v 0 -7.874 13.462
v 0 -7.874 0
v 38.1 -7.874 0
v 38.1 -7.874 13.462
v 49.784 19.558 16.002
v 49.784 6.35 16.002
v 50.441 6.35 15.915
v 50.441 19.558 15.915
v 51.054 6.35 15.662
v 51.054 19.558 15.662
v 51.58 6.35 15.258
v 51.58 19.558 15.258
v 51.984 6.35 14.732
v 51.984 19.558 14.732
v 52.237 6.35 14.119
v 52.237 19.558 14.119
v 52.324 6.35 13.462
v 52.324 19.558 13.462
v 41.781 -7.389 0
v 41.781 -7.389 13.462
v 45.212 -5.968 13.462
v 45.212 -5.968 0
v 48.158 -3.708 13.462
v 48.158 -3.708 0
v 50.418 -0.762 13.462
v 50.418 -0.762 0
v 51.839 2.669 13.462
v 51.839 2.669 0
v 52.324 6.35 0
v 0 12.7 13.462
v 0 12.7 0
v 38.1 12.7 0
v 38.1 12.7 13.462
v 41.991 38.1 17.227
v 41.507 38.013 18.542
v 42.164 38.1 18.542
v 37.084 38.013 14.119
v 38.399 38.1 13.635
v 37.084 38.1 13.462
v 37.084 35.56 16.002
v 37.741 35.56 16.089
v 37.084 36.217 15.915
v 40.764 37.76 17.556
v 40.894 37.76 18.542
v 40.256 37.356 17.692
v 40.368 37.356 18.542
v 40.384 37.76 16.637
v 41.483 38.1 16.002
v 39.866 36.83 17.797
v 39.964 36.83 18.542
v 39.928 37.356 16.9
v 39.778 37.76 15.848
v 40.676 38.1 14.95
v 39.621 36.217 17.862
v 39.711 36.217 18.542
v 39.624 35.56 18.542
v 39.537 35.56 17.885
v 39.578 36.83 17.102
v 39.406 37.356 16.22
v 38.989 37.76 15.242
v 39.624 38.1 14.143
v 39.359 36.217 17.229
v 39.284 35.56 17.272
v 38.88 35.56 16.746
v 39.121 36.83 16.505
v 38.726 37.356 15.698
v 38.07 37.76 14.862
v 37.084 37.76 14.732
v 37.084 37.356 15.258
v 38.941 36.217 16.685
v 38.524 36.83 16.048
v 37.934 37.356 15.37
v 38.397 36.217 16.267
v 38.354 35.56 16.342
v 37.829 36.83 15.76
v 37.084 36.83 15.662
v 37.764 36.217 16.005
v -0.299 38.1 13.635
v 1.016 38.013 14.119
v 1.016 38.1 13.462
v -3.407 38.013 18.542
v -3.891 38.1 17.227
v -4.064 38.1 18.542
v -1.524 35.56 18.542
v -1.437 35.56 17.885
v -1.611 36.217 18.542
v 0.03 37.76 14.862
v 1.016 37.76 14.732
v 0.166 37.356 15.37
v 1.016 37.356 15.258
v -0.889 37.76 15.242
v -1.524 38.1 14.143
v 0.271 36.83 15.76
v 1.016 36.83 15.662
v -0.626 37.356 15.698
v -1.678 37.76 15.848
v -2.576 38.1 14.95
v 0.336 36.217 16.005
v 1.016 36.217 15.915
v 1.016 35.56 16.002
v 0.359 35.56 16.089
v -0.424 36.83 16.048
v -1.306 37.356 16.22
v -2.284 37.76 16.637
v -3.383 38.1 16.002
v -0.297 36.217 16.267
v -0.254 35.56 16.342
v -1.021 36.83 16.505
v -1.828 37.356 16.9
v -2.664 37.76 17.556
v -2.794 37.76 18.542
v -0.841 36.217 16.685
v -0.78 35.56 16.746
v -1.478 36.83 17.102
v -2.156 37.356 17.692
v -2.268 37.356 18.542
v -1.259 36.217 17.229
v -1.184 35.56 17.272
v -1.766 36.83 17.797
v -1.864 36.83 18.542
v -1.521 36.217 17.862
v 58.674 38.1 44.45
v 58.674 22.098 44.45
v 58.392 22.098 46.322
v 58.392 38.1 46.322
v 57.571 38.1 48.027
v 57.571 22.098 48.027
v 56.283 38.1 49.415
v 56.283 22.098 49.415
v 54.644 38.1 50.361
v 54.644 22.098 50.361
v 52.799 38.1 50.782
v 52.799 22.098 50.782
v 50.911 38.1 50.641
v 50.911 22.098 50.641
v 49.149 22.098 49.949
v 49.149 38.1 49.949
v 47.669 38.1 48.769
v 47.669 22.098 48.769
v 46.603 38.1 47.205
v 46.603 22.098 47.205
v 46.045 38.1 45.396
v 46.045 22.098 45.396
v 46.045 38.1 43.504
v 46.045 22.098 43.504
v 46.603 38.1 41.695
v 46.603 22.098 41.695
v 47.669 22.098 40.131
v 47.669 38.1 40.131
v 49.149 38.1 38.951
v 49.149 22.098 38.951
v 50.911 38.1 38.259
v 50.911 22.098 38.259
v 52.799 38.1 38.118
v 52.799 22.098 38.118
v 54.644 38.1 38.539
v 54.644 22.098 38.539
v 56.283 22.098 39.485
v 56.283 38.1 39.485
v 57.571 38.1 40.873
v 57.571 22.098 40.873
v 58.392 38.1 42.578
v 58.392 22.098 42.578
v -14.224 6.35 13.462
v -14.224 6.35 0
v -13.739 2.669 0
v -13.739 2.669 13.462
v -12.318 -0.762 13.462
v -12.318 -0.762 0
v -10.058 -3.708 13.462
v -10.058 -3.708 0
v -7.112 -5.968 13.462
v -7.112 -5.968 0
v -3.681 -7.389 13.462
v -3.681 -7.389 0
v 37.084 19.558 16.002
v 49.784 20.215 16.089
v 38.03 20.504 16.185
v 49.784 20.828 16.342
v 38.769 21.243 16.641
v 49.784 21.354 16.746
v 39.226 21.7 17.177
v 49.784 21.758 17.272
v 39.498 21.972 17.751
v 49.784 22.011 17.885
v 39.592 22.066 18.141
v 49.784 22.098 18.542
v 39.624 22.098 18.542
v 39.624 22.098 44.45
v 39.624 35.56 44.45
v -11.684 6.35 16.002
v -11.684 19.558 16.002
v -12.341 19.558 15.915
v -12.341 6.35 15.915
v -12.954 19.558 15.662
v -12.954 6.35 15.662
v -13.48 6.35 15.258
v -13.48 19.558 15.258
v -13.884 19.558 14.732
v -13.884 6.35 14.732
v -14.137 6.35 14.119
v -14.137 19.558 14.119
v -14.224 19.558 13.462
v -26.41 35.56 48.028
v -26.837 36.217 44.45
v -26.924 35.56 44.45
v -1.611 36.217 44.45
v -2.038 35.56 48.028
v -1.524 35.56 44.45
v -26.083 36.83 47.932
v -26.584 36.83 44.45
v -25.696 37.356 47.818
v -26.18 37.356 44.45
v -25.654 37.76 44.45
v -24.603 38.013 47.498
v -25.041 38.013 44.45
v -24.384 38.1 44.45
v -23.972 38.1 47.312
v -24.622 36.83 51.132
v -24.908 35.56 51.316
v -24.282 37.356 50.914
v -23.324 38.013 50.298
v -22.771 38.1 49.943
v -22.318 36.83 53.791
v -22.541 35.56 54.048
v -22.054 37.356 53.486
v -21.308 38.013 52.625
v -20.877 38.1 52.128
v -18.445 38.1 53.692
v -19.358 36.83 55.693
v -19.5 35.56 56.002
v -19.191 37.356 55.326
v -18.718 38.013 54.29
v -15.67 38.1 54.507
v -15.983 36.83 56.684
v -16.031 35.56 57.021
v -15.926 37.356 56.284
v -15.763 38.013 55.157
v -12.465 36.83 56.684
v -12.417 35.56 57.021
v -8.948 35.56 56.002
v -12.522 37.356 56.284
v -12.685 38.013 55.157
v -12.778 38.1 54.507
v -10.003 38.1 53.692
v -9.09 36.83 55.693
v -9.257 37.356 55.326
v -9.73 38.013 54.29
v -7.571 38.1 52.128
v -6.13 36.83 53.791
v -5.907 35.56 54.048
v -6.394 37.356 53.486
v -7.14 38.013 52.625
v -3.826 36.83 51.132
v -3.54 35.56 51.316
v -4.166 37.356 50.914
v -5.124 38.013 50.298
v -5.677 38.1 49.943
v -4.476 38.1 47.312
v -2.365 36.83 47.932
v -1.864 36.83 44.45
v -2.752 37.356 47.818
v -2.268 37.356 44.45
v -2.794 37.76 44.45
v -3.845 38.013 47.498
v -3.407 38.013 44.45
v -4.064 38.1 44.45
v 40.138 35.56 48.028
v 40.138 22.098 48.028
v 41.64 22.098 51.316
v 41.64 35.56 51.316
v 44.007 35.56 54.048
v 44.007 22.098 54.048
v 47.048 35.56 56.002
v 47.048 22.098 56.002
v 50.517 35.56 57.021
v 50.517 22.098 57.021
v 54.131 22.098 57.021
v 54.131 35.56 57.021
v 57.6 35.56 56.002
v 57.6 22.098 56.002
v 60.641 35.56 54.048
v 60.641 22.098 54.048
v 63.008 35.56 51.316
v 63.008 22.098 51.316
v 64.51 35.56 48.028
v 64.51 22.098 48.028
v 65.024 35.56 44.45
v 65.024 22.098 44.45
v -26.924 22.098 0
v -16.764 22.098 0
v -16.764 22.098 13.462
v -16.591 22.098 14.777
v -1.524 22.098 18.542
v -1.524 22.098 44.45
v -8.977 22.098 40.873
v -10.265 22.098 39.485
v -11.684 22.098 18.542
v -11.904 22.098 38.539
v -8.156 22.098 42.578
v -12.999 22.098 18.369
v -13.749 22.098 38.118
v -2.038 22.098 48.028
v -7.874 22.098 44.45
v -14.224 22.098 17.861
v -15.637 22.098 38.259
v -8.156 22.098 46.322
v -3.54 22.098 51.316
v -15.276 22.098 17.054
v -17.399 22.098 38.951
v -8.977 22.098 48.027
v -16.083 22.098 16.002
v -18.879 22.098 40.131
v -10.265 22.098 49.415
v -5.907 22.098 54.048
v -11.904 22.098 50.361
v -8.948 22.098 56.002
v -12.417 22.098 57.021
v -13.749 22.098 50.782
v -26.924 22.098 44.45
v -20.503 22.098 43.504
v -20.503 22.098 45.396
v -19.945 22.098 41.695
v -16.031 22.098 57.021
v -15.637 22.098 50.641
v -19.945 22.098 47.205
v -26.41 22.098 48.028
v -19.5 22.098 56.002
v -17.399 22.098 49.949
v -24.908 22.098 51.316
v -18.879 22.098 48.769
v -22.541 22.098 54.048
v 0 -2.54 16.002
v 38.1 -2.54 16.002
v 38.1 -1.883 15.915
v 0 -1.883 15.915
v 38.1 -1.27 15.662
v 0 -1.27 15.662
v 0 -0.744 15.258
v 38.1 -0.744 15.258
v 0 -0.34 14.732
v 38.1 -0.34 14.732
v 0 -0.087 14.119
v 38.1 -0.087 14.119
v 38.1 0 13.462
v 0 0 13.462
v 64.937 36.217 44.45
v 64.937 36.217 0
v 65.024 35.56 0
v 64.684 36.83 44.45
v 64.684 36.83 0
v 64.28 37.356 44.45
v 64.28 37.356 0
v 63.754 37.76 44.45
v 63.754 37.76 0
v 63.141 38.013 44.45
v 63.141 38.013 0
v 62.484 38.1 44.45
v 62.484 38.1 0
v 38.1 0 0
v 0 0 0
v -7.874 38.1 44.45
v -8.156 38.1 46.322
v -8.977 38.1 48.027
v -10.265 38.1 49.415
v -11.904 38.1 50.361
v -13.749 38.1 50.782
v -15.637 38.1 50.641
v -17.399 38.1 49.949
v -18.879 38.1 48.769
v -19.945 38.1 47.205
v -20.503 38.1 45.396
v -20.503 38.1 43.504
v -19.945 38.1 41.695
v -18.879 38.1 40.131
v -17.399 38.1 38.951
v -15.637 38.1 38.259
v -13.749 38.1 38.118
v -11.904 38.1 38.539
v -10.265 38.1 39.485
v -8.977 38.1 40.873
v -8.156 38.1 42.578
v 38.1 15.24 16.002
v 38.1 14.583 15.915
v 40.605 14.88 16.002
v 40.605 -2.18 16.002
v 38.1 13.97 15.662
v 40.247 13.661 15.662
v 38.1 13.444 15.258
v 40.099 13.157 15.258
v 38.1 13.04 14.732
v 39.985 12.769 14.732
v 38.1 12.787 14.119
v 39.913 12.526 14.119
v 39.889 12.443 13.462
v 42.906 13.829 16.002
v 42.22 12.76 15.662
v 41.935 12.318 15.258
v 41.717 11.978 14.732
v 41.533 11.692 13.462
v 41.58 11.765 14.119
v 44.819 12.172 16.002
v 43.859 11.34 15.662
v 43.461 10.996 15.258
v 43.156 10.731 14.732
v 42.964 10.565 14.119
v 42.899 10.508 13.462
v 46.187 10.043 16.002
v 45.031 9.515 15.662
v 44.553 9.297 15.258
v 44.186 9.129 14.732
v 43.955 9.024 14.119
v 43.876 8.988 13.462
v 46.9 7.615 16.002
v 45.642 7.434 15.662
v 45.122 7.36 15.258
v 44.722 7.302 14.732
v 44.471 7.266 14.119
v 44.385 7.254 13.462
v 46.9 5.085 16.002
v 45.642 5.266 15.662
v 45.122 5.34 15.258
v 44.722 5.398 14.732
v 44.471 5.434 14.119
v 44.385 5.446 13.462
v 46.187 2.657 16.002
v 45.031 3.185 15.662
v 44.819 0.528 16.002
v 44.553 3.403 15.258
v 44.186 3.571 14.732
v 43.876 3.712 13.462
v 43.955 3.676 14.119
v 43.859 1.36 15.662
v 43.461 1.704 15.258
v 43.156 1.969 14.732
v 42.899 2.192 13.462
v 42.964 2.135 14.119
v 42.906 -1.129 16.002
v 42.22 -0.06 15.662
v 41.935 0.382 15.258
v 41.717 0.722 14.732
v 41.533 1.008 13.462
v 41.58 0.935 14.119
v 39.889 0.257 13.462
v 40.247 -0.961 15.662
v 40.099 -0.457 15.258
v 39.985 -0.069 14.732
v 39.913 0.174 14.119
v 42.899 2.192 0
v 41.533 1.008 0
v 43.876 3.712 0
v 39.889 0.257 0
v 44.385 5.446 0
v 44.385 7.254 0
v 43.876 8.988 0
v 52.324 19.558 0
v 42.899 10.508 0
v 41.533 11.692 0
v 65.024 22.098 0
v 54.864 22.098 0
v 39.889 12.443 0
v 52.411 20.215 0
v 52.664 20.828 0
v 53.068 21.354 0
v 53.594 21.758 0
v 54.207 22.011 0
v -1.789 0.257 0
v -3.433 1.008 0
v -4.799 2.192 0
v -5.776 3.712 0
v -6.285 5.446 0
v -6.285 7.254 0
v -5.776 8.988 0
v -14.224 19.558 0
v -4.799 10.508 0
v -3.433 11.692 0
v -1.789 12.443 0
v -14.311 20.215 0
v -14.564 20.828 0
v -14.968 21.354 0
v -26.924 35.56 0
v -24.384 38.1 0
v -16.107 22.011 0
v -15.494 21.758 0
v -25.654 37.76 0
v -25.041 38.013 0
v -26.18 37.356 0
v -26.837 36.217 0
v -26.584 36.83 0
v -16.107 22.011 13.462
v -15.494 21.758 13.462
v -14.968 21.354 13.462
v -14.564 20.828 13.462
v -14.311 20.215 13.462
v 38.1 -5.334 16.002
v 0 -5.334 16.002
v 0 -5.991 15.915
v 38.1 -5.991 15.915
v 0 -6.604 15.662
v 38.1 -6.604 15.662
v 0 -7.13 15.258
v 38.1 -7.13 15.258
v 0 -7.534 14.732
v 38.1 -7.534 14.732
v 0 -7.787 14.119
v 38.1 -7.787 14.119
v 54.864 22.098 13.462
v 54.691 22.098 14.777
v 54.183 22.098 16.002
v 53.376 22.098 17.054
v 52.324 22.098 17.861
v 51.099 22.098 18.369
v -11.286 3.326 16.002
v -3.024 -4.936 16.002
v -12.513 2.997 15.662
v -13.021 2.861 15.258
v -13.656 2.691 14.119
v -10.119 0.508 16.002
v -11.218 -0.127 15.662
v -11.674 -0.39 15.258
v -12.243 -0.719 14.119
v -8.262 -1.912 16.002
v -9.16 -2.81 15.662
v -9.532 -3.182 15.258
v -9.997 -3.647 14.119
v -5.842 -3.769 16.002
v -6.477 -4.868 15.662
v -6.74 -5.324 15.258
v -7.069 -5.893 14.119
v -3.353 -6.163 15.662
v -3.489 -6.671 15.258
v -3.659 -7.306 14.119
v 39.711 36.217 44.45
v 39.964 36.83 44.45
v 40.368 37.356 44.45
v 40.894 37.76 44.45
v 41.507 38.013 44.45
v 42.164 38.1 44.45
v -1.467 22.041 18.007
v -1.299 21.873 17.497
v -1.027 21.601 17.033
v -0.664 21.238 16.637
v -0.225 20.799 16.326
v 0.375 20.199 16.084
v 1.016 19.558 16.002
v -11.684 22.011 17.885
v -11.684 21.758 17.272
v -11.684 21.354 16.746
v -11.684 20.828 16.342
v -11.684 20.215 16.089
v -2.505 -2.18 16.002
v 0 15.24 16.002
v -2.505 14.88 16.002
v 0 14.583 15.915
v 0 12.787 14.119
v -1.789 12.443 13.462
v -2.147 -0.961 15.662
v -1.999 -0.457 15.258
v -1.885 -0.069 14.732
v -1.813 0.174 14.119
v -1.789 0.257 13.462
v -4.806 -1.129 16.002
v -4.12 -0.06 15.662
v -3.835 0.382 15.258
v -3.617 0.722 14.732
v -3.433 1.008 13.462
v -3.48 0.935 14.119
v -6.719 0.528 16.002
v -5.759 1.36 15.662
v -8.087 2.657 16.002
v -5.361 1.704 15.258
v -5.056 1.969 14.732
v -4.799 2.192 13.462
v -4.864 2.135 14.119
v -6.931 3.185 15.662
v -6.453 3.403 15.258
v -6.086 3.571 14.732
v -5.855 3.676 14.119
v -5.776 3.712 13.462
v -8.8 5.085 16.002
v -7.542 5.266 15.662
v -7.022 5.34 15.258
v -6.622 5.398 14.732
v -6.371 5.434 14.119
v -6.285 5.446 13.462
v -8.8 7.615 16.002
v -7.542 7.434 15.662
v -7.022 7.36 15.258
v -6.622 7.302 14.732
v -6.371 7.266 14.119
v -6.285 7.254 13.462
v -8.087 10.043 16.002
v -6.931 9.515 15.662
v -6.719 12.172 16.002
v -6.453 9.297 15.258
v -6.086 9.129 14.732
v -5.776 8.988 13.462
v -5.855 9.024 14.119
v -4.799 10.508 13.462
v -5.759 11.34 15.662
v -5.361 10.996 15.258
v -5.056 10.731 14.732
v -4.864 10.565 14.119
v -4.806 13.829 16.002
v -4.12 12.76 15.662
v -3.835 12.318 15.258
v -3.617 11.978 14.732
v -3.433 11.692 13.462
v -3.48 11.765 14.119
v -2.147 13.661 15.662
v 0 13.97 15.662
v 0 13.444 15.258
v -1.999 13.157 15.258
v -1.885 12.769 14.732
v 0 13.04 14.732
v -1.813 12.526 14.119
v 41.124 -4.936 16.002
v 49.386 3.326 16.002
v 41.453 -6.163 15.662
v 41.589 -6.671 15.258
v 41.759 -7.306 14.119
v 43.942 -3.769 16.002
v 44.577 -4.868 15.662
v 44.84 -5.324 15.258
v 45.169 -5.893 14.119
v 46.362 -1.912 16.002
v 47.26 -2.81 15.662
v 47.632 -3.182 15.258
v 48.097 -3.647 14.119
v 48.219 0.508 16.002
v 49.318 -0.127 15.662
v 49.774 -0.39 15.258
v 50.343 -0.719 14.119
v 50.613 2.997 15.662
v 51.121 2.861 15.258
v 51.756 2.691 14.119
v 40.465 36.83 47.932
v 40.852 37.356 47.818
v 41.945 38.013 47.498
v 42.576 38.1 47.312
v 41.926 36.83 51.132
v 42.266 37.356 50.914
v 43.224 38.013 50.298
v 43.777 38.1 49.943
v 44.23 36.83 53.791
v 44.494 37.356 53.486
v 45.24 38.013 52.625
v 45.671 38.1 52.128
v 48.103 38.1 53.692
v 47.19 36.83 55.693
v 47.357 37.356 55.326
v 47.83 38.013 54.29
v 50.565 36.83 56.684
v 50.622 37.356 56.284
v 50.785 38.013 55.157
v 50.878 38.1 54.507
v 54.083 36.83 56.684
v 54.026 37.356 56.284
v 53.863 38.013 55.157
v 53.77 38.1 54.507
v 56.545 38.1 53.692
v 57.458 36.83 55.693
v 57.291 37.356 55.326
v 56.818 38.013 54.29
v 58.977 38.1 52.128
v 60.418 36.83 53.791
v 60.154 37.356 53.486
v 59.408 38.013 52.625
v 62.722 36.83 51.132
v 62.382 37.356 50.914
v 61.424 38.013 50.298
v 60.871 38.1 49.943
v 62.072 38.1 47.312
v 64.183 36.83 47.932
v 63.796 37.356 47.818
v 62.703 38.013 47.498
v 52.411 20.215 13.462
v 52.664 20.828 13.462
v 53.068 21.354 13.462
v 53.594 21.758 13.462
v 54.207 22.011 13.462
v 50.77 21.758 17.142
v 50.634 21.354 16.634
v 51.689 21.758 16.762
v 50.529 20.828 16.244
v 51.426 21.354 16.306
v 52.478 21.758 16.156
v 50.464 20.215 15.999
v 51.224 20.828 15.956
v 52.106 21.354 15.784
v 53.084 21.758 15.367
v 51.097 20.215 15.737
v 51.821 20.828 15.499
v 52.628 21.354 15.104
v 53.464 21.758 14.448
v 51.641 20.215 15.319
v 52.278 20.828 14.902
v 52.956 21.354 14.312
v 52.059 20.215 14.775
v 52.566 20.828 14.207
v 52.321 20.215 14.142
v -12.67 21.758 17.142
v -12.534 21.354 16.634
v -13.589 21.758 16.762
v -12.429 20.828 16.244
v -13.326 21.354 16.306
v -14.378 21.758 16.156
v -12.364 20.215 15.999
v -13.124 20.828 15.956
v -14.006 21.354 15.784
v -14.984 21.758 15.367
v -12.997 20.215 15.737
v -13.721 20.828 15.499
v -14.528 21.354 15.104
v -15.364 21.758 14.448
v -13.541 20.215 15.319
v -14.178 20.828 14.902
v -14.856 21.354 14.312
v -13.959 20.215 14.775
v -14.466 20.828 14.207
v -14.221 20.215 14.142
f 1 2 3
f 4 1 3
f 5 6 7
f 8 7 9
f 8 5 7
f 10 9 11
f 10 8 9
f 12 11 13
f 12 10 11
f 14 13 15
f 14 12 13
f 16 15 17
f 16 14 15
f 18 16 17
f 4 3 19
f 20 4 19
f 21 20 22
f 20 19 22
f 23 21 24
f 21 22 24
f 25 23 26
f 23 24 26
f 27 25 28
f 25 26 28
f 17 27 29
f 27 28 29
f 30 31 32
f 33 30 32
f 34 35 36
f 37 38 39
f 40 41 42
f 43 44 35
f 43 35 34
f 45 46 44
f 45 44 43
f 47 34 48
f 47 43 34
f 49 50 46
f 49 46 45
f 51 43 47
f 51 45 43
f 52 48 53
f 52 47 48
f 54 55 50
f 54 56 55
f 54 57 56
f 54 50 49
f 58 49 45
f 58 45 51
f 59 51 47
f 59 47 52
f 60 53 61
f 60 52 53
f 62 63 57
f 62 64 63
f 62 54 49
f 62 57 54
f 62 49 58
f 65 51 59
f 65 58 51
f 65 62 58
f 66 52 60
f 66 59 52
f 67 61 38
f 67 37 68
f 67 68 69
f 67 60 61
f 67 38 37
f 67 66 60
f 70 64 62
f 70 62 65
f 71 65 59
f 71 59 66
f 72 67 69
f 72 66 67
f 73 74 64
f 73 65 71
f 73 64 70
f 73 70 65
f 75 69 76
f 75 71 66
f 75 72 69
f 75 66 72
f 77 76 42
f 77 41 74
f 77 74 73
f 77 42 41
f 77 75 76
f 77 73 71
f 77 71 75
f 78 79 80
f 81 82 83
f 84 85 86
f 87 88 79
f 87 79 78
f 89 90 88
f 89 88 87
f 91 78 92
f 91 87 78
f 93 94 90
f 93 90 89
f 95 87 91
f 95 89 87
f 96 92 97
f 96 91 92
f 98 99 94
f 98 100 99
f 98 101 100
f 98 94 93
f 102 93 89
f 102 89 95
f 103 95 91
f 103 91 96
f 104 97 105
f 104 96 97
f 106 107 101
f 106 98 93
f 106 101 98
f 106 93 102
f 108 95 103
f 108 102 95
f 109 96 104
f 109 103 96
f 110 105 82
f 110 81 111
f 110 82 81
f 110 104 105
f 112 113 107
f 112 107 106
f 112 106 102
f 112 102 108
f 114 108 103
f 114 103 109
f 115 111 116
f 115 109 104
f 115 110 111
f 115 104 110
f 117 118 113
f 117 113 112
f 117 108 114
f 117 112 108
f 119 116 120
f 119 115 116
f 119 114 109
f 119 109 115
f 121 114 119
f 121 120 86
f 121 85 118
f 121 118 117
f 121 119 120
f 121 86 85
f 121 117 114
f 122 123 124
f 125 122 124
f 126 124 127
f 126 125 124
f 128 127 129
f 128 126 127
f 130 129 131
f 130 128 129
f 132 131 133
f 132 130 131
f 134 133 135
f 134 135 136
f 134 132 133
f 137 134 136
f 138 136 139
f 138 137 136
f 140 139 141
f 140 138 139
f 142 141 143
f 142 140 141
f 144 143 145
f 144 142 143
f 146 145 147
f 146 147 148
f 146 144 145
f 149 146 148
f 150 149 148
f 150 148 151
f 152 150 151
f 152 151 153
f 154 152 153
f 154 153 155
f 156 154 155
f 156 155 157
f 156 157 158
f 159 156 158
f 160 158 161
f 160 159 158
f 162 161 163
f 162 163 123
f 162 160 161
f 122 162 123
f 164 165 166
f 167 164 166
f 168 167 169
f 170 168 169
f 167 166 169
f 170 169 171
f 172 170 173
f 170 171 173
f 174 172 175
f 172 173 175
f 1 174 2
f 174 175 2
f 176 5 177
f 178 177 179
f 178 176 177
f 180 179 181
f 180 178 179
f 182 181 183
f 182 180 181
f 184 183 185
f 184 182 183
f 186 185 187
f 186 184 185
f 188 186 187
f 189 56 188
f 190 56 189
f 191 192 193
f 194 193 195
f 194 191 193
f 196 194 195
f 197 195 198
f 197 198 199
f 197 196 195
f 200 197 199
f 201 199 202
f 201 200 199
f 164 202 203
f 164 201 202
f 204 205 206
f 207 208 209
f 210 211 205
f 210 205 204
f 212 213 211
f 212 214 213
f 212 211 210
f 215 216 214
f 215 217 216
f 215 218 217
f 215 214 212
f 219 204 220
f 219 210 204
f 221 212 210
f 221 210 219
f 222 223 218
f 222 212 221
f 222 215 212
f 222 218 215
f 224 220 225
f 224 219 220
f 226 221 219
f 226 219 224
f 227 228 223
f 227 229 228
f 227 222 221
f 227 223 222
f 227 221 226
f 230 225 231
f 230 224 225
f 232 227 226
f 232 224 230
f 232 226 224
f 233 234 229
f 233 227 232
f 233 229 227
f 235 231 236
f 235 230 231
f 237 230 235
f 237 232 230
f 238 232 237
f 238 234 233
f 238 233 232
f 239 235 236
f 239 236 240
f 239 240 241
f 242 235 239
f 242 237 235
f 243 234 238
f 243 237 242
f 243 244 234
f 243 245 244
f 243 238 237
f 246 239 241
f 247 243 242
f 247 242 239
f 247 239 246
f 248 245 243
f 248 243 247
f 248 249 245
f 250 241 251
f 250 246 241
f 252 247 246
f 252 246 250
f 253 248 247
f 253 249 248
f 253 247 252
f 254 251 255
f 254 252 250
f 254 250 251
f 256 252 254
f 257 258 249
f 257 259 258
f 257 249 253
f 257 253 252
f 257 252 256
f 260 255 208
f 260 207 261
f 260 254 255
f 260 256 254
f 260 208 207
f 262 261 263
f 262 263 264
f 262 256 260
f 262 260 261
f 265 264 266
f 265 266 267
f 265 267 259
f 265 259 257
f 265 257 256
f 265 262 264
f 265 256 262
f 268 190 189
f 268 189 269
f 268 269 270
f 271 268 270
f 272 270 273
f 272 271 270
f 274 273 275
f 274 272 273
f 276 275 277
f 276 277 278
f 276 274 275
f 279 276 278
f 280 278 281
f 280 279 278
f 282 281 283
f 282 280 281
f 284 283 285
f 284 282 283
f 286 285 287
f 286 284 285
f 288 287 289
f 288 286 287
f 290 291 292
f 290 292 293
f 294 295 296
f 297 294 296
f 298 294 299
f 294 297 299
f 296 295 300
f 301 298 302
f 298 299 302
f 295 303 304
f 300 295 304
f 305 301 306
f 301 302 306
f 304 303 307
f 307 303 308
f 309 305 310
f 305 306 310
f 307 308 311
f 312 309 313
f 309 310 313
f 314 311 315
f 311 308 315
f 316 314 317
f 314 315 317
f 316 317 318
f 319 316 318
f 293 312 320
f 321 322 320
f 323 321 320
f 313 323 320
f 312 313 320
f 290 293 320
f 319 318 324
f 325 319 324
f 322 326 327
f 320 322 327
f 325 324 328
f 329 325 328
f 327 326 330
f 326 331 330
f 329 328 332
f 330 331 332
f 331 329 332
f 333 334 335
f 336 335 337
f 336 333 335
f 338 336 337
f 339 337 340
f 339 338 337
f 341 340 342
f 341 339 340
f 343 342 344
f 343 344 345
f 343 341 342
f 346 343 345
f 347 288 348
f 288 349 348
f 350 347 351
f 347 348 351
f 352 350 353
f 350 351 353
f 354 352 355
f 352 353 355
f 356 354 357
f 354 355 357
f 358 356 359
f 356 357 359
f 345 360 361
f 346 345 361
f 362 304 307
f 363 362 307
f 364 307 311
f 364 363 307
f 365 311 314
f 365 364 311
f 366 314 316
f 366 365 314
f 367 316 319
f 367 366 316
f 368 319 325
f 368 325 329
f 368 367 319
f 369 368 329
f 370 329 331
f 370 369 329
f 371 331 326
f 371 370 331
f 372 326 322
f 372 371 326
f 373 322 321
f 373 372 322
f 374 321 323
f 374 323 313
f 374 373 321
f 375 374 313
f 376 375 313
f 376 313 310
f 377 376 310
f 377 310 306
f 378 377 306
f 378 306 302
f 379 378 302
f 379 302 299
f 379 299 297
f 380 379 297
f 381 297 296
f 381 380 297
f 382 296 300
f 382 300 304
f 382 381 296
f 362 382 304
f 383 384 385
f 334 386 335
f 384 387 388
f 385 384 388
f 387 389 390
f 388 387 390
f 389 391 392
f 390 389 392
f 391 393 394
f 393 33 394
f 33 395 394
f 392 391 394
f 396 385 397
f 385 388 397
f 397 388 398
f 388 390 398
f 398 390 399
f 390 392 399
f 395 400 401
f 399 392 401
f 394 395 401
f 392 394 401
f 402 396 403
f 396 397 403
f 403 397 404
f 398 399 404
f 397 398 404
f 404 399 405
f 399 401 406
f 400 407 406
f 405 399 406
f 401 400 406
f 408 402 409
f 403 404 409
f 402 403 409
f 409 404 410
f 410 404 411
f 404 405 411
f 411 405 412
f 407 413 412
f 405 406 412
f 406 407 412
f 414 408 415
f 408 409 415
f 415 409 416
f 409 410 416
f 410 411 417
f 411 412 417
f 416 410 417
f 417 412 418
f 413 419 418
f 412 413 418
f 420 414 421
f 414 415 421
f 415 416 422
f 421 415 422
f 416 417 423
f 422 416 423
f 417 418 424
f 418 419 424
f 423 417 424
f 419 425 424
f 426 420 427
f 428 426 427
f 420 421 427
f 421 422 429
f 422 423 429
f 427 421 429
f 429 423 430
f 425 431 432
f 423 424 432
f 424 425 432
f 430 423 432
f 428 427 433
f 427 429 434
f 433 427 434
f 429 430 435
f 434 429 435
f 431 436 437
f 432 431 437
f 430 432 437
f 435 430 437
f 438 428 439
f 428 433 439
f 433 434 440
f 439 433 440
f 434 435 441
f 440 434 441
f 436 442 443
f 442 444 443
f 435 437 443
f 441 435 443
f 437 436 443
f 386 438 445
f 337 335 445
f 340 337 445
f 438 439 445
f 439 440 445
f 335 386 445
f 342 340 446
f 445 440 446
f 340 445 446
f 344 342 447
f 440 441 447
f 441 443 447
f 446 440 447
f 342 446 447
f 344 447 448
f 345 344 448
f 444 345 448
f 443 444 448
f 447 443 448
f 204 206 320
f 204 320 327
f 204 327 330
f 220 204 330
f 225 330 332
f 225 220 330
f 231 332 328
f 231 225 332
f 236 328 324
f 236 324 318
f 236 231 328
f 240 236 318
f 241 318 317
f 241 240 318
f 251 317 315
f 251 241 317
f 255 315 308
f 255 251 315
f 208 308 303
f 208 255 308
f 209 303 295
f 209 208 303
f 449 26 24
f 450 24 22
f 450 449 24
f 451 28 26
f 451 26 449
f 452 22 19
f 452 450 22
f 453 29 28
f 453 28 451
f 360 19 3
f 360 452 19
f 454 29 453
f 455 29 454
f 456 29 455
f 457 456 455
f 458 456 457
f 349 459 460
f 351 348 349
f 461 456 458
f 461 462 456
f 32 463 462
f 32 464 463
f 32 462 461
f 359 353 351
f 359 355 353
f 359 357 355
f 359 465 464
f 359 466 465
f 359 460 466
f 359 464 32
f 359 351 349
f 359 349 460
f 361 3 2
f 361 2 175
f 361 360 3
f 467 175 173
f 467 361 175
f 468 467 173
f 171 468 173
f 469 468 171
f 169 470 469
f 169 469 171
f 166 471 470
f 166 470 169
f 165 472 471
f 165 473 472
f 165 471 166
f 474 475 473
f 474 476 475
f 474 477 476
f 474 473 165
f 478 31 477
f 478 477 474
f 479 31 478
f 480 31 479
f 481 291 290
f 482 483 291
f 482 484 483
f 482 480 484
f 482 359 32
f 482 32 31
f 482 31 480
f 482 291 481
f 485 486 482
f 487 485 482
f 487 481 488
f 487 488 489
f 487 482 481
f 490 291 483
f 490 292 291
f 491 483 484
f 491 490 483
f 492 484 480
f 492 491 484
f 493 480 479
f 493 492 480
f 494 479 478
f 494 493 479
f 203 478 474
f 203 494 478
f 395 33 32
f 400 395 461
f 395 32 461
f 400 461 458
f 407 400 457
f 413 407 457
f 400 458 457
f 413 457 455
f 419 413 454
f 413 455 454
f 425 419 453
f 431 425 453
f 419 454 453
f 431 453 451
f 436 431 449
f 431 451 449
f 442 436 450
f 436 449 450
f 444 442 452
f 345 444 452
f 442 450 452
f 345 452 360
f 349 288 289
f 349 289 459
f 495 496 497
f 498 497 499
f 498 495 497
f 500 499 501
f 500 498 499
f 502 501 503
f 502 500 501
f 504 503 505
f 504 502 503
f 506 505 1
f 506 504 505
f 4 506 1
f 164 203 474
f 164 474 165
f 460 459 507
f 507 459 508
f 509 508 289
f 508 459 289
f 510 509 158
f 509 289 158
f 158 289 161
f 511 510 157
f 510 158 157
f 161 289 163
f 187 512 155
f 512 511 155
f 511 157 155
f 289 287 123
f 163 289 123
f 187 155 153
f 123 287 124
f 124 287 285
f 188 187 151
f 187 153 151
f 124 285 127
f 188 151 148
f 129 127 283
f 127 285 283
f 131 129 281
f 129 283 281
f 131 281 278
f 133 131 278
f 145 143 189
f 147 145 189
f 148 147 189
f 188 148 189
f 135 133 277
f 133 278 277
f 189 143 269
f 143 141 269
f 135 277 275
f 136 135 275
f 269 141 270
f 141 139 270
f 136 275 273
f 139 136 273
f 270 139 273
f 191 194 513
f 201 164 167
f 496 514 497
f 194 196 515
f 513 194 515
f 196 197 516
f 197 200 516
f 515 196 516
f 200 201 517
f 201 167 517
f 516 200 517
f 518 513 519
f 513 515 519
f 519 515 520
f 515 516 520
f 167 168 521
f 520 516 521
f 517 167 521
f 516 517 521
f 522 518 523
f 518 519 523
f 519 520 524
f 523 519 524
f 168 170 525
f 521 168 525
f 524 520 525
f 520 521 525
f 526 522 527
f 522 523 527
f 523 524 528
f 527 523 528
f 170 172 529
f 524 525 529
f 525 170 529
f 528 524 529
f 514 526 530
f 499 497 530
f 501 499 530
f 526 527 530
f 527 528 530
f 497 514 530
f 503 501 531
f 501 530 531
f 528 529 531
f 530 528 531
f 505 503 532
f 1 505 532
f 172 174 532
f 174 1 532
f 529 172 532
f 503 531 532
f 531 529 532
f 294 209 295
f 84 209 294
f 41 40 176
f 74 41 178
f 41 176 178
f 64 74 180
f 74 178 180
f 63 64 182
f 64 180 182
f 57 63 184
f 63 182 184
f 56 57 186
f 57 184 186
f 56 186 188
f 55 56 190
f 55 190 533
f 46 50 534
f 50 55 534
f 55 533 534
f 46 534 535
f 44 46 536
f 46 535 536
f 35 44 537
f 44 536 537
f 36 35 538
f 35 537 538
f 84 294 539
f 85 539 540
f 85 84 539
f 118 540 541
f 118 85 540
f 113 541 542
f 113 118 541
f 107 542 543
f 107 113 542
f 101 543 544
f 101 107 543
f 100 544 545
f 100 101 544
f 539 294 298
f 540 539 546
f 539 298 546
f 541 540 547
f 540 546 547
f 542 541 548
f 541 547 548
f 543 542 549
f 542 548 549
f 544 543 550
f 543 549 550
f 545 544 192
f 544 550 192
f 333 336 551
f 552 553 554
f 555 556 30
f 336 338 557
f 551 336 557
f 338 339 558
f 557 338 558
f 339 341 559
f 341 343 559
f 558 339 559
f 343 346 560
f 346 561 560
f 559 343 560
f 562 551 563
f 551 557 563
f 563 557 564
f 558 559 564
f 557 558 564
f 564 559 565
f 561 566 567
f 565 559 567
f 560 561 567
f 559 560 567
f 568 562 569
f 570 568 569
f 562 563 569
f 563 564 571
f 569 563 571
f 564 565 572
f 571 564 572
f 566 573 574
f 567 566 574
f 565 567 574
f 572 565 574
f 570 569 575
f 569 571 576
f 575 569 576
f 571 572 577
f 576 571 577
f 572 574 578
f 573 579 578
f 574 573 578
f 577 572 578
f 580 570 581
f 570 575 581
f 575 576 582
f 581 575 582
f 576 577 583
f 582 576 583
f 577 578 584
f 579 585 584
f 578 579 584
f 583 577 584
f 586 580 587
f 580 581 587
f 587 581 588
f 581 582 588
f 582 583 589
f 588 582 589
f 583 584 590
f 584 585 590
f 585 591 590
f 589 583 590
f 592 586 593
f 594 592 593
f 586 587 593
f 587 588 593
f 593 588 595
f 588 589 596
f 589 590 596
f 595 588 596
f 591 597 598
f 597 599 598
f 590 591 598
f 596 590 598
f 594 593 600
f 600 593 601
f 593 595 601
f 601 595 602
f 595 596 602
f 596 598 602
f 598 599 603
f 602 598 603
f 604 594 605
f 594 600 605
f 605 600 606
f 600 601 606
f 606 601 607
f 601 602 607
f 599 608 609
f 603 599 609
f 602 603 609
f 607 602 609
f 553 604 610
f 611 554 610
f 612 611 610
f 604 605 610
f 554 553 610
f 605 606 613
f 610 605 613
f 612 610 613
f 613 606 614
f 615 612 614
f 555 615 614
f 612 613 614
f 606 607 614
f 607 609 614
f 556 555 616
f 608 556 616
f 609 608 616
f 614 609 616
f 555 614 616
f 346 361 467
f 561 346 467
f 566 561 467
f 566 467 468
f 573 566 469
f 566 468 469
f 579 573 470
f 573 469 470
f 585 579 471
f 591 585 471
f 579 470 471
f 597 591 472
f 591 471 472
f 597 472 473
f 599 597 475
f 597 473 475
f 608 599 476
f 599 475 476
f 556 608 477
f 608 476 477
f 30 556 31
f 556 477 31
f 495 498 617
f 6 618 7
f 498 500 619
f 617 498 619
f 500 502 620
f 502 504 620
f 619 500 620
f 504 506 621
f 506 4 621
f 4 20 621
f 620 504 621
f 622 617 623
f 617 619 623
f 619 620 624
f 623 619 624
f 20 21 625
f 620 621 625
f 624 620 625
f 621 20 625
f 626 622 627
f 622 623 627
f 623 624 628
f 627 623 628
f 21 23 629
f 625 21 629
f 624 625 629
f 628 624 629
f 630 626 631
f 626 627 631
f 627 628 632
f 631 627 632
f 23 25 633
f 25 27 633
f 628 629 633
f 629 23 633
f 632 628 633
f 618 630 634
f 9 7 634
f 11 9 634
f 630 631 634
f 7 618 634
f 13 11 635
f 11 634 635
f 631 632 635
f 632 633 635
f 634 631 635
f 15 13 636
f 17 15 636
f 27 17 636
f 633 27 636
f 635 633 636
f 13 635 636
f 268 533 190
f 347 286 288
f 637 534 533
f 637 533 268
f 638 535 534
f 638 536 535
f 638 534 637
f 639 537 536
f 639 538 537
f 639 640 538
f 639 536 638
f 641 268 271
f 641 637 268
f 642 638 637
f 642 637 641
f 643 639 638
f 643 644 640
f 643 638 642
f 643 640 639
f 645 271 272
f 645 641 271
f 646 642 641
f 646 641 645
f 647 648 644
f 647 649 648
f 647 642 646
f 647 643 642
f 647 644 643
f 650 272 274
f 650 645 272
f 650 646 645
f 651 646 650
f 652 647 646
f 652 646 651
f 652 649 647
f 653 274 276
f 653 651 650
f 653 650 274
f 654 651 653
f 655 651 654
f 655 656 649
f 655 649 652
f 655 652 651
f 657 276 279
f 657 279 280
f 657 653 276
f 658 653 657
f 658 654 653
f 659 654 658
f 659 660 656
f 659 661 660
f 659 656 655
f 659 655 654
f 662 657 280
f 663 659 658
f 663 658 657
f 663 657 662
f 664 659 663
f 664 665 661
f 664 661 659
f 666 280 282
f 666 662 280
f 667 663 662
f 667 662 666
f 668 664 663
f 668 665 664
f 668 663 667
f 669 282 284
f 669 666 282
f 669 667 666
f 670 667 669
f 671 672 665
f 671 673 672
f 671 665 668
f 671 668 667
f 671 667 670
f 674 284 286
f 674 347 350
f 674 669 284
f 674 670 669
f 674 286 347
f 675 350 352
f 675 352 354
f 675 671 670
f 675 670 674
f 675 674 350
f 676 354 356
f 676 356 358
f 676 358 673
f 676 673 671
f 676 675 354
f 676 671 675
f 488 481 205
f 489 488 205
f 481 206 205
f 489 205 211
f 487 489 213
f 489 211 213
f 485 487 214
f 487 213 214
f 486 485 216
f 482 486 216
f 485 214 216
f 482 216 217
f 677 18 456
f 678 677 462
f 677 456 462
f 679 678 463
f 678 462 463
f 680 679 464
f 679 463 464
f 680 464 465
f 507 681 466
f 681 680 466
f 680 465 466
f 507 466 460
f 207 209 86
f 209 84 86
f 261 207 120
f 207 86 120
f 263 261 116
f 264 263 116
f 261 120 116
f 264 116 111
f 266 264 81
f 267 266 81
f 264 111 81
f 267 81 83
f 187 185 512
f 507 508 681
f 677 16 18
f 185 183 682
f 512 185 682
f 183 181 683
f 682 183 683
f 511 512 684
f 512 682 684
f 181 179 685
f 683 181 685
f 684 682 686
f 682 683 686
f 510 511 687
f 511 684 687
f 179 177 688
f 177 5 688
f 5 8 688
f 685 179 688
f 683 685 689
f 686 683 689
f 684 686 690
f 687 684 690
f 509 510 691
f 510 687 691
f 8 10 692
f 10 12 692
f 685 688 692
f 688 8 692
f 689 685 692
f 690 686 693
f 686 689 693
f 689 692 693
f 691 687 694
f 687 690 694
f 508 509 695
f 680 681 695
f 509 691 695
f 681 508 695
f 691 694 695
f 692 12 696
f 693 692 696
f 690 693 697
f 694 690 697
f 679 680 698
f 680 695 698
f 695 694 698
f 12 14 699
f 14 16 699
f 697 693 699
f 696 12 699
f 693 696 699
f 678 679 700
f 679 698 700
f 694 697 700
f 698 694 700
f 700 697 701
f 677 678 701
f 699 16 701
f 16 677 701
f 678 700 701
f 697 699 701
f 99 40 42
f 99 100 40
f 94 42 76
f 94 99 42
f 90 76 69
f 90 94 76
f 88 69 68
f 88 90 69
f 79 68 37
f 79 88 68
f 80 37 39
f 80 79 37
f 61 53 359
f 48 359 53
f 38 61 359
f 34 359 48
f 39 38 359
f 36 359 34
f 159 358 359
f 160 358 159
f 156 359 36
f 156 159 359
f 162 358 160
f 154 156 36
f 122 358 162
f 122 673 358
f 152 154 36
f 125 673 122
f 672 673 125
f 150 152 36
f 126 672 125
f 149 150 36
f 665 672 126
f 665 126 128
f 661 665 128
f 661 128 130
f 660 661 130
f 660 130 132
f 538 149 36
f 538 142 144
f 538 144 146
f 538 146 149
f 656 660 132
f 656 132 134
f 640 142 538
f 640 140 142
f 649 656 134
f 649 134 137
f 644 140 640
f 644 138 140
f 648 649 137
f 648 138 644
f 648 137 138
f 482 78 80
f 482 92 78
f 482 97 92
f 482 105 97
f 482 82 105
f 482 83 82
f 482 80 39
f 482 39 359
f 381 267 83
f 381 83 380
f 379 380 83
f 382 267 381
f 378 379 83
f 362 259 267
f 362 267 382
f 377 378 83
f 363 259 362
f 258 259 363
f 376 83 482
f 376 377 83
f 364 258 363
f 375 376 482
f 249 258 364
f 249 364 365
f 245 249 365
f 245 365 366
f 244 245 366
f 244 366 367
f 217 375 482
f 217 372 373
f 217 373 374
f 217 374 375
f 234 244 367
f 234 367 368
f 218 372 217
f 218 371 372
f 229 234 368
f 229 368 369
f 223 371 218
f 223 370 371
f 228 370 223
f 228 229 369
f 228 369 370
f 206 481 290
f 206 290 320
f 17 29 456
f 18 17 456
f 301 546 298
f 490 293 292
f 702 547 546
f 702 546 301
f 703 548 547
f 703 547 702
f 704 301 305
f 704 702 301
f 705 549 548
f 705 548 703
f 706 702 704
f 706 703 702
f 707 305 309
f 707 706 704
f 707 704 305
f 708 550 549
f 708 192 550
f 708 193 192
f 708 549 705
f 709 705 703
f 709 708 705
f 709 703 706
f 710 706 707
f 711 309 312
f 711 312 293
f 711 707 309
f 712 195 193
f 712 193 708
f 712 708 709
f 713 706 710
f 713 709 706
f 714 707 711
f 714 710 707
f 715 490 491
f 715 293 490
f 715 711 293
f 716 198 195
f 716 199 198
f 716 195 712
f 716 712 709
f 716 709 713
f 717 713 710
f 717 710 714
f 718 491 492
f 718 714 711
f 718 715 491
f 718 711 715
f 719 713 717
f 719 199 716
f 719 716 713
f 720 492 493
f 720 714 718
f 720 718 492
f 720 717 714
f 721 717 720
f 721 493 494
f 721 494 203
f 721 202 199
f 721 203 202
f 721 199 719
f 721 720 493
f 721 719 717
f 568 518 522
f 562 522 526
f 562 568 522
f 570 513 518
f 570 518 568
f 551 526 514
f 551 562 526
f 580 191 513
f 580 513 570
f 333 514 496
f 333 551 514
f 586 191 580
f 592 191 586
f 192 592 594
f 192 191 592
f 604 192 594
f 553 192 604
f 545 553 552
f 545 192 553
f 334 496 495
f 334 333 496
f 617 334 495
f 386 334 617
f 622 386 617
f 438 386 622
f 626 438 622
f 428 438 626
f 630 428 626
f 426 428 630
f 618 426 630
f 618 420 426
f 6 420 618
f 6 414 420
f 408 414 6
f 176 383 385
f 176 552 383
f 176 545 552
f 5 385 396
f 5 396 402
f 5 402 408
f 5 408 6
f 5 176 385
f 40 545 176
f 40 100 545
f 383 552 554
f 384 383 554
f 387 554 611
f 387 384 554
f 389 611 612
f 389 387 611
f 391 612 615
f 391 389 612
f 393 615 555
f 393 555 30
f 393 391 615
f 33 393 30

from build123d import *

# Parameters (mm, degrees)
F1_DEPTH = 16.002
F3_DEPTH = 16.002
F4_R     = 2.54


with BuildPart() as f1:
    # F0 (on Top) → F1 (new body)
    with BuildSketch(Plane.XY):
        with BuildLine():
            ThreePointArc((38.1, -7.874), (48.1578868556, -3.7078868556), (52.324, 6.35))
            Line((52.324, 6.35), (52.324, 38.1))
            Line((52.324, 38.1), (-14.224, 38.1))
            Line((-14.224, 38.1), (-14.224, 6.35))
            ThreePointArc((-14.224, 6.35), (-10.0578868556, -3.7078868556), (0, -7.874))
            Line((0, -7.874), (38.1, -7.874))
        make_face()
        with BuildLine():
            Line((38.1, 0), (0, 0))
            ThreePointArc((0, 0), (-6.35, 6.35), (0, 12.7))
            Line((0, 12.7), (38.1, 12.7))
            ThreePointArc((38.1, 12.7), (44.45, 6.35), (38.1, 0))
        make_face(mode=Mode.SUBTRACT)
    extrude(amount=F1_DEPTH)

    # F2 (on face) → F3 (join)
    with BuildSketch(Plane(origin=(0, 38.1, 0), x_dir=(-1, 0, 0), z_dir=(0, 1, 0))):
        with BuildLine():
            Line((26.924, 0), (26.924, 44.45))
            Line((26.924, 44.45), (20.574, 44.45))
            ThreePointArc((20.574, 44.45), (14.224, 38.1), (7.874, 44.45))
            Line((7.874, 44.45), (1.524, 44.45))
            Line((1.524, 44.45), (1.524, 0))
            Line((1.524, 0), (26.924, 0))
        make_face()
        with BuildLine():
            Line((20.574, 44.45), (26.924, 44.45))
            ThreePointArc((26.924, 44.45), (14.224, 57.15), (1.524, 44.45))
            Line((1.524, 44.45), (7.874, 44.45))
            ThreePointArc((7.874, 44.45), (14.224, 50.8), (20.574, 44.45))
        make_face()
        with BuildLine():
            Line((-39.624, 0), (-39.624, 44.45))
            Line((-39.624, 44.45), (-45.974, 44.45))
            ThreePointArc((-45.974, 44.45), (-52.324, 38.1), (-58.674, 44.45))
            Line((-58.674, 44.45), (-65.024, 44.45))
            Line((-65.024, 44.45), (-65.024, 0))
            Line((-65.024, 0), (-39.624, 0))
        make_face()
        with BuildLine():
            Line((-45.974, 44.45), (-39.624, 44.45))
            ThreePointArc((-39.624, 44.45), (-52.324, 57.15), (-65.024, 44.45))
            Line((-65.024, 44.45), (-58.674, 44.45))
            ThreePointArc((-58.674, 44.45), (-52.324, 50.8), (-45.974, 44.45))
        make_face()
    extrude(amount=-F3_DEPTH)

    # F4
    f4_edges = [f1.edges().sort_by_distance(p)[0] for p in [
        (52.324, 14.224, 16.002),
        (-10.057887, -3.707887, 16.002),
        (-14.224, 14.224, 16.002),
        (-7.874, 22.098, 16.002),
        (-1.524, 30.099, 16.002),
        (19.05, 38.1, 16.002),
        (39.624, 30.099, 16.002),
        (45.974, 22.098, 16.002),
        (48.157887, -3.707887, 16.002),
        (19.05, -7.874, 16.002),
        (44.45, 6.35, 16.002),
        (19.05, 12.7, 16.002),
        (19.05, 0, 16.002),
        (-6.35, 6.35, 16.002),
        (52.324, 22.098, 8.001),
        (52.324, 38.1, 57.15),
        (65.024, 38.1, 22.225),
        (39.624, 38.1, 30.226),
        (-1.524, 38.1, 30.226),
        (-14.224, 38.1, 57.15),
        (-26.924, 38.1, 22.225),
        (-14.224, 22.098, 8.001),
    ]]
    fillet(f4_edges, radius=F4_R)


solid = f1.part
